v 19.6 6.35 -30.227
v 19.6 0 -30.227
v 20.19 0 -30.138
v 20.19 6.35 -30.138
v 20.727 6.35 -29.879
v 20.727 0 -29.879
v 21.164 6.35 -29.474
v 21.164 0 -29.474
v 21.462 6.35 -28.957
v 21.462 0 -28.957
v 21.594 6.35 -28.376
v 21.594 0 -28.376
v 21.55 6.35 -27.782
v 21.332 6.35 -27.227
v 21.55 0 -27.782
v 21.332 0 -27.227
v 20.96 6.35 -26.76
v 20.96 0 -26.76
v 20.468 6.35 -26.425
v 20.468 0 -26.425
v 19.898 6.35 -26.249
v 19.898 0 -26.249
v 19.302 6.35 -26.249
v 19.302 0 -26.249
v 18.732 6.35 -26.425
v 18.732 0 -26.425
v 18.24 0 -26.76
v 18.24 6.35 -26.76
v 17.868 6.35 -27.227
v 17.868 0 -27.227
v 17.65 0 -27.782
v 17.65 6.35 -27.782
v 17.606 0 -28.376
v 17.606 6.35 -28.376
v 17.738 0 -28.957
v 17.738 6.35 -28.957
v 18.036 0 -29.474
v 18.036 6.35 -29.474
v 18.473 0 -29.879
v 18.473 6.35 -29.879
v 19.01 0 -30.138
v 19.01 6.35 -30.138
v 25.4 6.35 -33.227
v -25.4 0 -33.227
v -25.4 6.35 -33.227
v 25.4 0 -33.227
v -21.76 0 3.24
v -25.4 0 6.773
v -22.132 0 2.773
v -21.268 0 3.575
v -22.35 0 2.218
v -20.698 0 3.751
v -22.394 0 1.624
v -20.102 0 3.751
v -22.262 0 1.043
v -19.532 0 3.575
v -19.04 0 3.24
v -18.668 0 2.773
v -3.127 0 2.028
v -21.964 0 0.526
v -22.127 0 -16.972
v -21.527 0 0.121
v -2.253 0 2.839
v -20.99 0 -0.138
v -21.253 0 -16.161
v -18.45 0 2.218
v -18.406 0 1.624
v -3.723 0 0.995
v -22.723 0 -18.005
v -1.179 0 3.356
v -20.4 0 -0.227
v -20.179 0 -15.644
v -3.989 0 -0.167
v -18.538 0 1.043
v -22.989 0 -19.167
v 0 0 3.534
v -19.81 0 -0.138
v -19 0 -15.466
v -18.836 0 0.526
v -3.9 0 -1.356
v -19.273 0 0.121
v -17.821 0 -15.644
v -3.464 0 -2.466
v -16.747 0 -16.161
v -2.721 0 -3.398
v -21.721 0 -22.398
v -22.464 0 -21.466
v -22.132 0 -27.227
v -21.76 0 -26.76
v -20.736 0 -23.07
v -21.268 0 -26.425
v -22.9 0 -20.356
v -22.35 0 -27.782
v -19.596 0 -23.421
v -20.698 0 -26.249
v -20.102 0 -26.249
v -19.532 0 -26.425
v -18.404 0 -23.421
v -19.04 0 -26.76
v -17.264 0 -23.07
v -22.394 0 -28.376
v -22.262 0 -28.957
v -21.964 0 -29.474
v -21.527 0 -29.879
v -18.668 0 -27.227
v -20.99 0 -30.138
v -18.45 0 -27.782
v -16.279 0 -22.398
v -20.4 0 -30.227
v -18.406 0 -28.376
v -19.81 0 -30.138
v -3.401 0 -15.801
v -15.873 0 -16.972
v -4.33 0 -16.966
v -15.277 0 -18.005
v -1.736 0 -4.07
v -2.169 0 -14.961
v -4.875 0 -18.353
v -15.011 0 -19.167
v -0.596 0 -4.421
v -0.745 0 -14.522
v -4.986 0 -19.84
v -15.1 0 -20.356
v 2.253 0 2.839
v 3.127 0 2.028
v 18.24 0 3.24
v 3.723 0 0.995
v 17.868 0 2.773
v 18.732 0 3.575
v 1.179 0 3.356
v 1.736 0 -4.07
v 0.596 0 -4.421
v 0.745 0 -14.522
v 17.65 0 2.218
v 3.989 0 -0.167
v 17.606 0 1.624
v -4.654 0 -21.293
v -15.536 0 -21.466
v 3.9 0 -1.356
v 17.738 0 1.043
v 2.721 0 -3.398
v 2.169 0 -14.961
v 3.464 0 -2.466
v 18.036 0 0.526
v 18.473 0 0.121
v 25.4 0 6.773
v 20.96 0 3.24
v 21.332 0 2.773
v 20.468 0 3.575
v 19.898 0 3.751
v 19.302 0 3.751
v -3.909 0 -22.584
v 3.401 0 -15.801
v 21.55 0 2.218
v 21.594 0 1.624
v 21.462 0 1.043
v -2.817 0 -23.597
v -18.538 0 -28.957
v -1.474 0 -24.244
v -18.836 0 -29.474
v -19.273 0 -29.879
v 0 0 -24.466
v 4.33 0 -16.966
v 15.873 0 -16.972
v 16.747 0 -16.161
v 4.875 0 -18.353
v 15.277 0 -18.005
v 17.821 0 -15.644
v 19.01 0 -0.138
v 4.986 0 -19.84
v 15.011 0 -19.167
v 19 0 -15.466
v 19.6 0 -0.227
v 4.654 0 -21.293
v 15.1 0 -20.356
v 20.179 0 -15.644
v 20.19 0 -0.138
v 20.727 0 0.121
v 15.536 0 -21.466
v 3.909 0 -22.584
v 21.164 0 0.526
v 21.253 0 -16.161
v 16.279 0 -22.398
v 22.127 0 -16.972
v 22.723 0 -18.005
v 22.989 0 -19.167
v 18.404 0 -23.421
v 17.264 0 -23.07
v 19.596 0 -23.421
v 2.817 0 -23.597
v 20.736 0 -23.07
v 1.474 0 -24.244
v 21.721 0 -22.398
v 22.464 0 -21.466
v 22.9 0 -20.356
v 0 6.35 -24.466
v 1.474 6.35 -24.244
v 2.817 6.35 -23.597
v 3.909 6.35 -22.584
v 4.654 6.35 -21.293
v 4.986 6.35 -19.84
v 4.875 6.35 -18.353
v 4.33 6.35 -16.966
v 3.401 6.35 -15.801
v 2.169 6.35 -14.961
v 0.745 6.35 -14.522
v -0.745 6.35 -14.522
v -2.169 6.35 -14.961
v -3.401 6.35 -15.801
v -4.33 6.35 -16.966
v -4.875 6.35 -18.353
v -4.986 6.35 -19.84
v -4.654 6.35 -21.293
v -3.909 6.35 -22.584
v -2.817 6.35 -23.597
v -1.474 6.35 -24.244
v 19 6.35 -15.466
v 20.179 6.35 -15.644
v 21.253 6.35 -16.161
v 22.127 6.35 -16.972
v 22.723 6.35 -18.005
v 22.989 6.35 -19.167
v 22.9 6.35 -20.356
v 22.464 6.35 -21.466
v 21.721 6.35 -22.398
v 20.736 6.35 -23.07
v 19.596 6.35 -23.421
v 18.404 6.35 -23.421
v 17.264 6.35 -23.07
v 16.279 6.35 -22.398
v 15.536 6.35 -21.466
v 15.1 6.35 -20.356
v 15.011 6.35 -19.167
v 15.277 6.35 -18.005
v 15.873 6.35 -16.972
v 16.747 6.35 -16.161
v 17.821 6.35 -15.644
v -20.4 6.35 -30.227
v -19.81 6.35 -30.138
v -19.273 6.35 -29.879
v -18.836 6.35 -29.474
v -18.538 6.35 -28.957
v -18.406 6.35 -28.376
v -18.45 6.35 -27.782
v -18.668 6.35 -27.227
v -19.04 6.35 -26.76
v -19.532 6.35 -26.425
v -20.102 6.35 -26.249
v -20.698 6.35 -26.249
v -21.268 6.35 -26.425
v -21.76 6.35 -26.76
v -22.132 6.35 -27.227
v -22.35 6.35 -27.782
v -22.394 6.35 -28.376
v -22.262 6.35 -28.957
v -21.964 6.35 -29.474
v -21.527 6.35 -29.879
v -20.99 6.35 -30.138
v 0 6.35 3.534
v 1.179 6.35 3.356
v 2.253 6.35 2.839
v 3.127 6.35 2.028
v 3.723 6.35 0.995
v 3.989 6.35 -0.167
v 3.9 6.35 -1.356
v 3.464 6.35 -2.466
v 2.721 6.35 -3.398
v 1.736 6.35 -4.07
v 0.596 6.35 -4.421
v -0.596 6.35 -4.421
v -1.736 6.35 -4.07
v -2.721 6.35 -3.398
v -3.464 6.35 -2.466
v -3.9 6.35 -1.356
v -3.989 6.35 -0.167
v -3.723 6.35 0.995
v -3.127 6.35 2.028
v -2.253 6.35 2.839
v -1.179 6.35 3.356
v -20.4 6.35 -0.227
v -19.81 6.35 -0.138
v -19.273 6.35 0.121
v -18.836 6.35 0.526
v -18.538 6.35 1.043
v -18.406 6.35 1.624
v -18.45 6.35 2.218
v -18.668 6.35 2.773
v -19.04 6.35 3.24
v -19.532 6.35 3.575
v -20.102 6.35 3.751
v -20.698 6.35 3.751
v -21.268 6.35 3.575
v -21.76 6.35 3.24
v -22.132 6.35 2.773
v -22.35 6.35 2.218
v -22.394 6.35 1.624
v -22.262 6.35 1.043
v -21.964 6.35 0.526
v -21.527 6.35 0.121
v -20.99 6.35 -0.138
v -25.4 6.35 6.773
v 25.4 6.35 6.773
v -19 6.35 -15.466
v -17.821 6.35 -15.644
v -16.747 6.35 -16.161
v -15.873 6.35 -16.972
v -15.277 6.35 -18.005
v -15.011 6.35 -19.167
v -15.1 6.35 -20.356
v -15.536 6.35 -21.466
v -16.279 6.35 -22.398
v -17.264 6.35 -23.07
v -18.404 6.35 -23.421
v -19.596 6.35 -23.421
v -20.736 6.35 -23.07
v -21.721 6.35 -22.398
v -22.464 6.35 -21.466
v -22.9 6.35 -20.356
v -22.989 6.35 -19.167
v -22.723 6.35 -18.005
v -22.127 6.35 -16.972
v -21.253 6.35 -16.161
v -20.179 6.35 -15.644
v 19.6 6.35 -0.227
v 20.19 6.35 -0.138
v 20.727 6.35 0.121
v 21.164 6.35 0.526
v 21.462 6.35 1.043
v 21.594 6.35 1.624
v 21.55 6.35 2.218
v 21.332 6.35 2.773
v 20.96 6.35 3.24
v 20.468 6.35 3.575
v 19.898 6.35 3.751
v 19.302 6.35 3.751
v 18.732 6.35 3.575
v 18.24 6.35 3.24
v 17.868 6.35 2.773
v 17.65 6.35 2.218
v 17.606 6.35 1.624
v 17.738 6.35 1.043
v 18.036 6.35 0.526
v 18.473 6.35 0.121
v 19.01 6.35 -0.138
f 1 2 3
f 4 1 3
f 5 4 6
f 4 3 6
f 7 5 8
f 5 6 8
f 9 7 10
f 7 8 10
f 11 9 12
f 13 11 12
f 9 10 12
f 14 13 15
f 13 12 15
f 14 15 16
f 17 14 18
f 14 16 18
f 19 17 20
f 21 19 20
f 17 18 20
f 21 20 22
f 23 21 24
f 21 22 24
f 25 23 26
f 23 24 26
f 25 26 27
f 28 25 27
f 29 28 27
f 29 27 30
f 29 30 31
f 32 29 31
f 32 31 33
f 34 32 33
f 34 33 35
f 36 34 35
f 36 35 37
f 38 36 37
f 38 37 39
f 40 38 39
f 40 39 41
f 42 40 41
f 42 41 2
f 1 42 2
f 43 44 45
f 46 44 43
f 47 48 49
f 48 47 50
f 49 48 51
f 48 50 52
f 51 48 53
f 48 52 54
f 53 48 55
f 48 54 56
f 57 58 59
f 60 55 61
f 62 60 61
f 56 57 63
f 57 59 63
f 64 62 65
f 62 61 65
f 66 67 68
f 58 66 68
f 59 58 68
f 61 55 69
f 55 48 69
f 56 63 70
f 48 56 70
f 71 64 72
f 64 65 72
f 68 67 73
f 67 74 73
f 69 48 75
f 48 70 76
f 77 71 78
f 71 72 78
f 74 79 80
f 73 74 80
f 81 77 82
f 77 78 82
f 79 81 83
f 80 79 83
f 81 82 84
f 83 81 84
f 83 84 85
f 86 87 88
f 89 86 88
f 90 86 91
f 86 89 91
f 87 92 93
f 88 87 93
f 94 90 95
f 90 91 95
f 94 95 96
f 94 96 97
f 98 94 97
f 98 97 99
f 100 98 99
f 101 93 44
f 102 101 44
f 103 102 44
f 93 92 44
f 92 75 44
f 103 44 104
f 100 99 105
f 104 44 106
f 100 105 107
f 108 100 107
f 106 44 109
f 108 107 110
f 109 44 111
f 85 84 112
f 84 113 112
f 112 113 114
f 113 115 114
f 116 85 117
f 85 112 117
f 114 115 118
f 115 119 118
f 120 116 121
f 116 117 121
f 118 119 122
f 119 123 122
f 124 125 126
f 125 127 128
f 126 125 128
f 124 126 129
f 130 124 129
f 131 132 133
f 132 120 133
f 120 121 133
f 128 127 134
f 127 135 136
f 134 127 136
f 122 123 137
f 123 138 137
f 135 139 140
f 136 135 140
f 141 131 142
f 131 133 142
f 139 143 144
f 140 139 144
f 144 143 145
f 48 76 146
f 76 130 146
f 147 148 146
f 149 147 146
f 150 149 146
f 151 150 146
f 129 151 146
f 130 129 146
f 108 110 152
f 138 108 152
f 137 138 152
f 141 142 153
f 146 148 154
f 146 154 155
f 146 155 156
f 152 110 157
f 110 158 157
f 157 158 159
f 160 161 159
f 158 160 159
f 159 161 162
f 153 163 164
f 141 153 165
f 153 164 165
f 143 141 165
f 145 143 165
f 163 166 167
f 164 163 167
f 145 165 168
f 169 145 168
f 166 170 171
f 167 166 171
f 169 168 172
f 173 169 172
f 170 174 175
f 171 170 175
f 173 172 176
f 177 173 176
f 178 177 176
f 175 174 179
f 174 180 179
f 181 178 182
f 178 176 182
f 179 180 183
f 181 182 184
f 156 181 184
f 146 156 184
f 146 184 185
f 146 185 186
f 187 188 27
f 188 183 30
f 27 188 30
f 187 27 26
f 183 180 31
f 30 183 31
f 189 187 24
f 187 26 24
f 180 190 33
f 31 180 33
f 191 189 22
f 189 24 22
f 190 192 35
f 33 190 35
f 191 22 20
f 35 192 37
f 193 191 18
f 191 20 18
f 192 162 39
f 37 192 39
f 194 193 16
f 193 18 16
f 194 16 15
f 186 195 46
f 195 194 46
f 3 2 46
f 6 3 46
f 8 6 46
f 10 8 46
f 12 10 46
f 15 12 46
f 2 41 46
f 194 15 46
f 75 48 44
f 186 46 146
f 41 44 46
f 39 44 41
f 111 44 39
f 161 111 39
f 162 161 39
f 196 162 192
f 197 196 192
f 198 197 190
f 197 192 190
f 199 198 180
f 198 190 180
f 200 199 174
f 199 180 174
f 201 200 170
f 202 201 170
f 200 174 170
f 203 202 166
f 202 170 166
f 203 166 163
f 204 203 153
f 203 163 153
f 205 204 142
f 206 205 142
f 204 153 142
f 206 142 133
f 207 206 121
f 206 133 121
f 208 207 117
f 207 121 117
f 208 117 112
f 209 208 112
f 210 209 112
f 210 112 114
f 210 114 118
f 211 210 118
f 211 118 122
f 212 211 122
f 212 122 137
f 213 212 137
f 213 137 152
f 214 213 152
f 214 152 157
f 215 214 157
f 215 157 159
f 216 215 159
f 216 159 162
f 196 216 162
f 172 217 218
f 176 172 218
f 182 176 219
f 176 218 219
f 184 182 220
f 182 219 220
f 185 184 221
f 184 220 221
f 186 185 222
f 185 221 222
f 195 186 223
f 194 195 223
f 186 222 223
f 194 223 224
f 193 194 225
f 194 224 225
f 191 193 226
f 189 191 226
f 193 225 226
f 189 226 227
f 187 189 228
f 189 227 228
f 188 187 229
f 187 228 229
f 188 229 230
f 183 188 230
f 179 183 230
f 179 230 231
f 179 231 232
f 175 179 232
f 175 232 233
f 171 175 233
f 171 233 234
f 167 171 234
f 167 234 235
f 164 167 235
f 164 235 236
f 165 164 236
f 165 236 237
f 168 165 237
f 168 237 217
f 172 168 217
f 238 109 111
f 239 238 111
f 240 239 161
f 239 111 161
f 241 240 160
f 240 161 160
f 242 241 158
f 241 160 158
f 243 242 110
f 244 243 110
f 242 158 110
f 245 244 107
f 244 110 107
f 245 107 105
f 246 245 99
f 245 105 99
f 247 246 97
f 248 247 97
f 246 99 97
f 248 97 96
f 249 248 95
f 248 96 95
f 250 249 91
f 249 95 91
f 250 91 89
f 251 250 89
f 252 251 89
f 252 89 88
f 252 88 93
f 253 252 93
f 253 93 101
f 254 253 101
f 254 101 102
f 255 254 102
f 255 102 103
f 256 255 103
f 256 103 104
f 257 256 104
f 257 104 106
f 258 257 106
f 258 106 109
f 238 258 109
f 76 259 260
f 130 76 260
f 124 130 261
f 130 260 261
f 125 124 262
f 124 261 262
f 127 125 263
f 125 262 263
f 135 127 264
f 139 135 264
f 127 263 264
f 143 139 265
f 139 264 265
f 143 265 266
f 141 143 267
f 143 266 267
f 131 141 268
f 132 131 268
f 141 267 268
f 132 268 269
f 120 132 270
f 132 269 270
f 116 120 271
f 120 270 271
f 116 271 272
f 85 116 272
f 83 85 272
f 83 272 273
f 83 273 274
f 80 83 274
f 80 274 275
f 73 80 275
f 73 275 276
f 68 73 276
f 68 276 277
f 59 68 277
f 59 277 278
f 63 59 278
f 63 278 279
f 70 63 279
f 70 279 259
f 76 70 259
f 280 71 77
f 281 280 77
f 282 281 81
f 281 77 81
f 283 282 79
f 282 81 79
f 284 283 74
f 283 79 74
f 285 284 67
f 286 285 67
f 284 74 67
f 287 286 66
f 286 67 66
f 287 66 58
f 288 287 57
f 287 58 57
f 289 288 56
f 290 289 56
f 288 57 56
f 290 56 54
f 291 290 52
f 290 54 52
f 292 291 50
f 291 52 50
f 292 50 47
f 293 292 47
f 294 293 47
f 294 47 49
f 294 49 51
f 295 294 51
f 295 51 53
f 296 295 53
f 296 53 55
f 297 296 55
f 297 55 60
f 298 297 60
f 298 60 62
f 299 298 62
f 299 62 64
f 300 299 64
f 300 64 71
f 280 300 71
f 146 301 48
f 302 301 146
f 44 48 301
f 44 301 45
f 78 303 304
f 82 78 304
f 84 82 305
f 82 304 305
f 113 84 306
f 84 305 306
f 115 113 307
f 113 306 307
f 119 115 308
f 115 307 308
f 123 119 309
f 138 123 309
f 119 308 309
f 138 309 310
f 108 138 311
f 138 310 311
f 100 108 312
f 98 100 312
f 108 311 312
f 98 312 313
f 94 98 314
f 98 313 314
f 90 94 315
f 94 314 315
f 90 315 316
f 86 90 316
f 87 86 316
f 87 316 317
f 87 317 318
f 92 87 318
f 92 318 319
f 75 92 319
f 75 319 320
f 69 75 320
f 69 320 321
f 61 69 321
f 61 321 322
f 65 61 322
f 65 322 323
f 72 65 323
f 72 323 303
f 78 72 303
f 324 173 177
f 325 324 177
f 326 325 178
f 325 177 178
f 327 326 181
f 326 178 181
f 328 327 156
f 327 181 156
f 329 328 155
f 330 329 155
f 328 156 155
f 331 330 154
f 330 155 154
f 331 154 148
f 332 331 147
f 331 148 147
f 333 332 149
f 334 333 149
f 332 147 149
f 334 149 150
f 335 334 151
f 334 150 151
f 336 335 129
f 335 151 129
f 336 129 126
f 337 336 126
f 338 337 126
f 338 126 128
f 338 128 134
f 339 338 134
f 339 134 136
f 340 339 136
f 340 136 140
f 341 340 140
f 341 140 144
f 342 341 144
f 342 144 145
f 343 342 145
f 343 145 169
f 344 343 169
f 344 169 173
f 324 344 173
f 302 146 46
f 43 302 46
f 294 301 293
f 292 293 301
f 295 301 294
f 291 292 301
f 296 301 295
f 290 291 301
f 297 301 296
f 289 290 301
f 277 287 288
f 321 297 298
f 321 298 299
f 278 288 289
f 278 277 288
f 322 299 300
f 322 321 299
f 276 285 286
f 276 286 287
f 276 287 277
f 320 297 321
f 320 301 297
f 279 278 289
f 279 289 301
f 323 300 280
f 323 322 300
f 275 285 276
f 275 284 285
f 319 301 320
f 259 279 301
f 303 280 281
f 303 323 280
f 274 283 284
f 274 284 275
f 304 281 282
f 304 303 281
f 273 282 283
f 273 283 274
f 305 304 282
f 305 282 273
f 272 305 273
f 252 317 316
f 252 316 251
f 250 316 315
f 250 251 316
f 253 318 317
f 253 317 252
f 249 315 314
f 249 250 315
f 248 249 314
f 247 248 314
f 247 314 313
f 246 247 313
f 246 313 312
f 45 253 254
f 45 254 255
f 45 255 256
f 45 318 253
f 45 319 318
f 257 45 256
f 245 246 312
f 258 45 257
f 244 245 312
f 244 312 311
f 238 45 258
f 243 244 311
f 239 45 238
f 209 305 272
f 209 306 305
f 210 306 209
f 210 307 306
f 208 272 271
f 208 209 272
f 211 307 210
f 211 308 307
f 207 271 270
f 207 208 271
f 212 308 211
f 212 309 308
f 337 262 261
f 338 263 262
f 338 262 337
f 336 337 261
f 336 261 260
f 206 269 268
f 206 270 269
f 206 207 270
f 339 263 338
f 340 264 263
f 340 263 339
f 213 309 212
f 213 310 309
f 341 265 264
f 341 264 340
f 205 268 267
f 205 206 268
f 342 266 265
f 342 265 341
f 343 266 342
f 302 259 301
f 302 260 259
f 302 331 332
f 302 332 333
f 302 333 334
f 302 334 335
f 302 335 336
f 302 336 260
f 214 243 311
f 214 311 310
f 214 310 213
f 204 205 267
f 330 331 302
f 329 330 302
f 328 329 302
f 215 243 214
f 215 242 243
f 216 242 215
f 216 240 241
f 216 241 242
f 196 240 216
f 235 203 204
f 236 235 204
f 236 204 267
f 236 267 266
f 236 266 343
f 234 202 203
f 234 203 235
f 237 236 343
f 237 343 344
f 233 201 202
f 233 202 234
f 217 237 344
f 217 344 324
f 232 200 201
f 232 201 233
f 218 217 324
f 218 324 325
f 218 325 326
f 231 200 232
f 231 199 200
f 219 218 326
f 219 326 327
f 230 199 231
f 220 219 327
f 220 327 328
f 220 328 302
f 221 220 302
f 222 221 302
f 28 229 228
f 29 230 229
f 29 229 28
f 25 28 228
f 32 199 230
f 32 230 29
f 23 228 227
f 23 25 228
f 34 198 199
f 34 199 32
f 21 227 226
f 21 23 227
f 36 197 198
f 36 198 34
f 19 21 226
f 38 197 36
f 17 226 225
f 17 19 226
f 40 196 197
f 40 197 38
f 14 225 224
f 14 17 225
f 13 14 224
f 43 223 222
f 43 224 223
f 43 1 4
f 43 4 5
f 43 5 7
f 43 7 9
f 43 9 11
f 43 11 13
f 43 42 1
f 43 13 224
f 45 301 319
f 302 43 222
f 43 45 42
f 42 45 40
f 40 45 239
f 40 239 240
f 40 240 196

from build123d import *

# Parameters (mm, degrees)
CROQUIS1_W              = 50.8
CROQUIS1_H              = 80
SALIENTE_EXTRUIR1_DEPTH = 6.35
CROQUIS4_R              = 4
CORTAR_EXTRUIR3_DEPTH   = 48.806720239
CROQUIS5_W              = 50.8
CROQUIS5_H              = 12.7
CORTAR_EXTRUIR4_DEPTH   = 48.806720239
CROQUIS6_W              = 50.8
CROQUIS6_H              = 20.526572449
CORTAR_EXTRUIR5_DEPTH   = 10
CROQUIS7_W              = 50.8
CROQUIS7_H              = 6.773427551
CORTAR_EXTRUIR6_DEPTH   = 10
CROQUIS9_R              = 5
CORTAR_EXTRUIR7_DEPTH   = 10
CROQUIS10_R             = 2
CORTAR_EXTRUIR8_DEPTH   = 10


with BuildPart() as part:
    # Croquis1 → Saliente-Extruir1 (new body)
    with BuildSketch(Plane(origin=(0, 0, 0), x_dir=(1, 0, 0), z_dir=(0, 1, 0))):
        Rectangle(CROQUIS1_W, CROQUIS1_H)
    extrude(amount=SALIENTE_EXTRUIR1_DEPTH)

    # Croquis4 → Cortar-Extruir3 (cut, through all)
    with BuildSketch(Plane(origin=(0, 6.35, 0), x_dir=(1, 0, 0), z_dir=(0, 1, 0))):
        with Locations(Location((-19, 19.466091849, 0), (0, 0, 270))):
            Circle(CROQUIS4_R)
        with Locations(Location((19, 19.466091849, 0), (0, 0, 270))):
            Circle(CROQUIS4_R)
        with Locations(Location((0, 0.466091849, 0), (0, 0, 270))):
            Circle(CROQUIS4_R)
    extrude(amount=-CORTAR_EXTRUIR3_DEPTH, mode=Mode.SUBTRACT)

    # Croquis5 → Cortar-Extruir4 (cut, through all)
    with BuildSketch(Plane(origin=(0, 6.35, 0), x_dir=(1, 0, 0), z_dir=(0, 1, 0))):
        with Locations((0, -33.65)):
            Rectangle(CROQUIS5_W, CROQUIS5_H)
    extrude(amount=-CORTAR_EXTRUIR4_DEPTH, mode=Mode.SUBTRACT)

    # Croquis6 → Cortar-Extruir5 (cut)
    with BuildSketch(Plane(origin=(0, 6.35, 0), x_dir=(1, 0, 0), z_dir=(0, 1, 0))):
        with Locations((0, -17.036713776)):
            Rectangle(CROQUIS6_W, CROQUIS6_H)
    extrude(amount=-CORTAR_EXTRUIR5_DEPTH, mode=Mode.SUBTRACT)

    # Croquis7 → Cortar-Extruir6 (cut)
    with BuildSketch(Plane.XZ):
        with Locations((0, -36.613286225)):
            Rectangle(CROQUIS7_W, CROQUIS7_H)
    extrude(amount=-CORTAR_EXTRUIR6_DEPTH, mode=Mode.SUBTRACT)

    # Croquis9 → Cortar-Extruir7 (cut)
    with BuildSketch(Plane.XZ):
        with Locations(Location((0, -19.466091849, 0), (0, 0, 270))):
            Circle(CROQUIS9_R)
    extrude(amount=-CORTAR_EXTRUIR7_DEPTH, mode=Mode.SUBTRACT)

    # Croquis10 → Cortar-Extruir8 (cut)
    with BuildSketch(Plane.XZ):
        with Locations(Location((-20.4, 1.773427551, 0), (0, 0, 270))):
            Circle(CROQUIS10_R)
        with Locations(Location((19.6, 1.773427551, 0), (0, 0, 270))):
            Circle(CROQUIS10_R)
        with Locations(Location((19.6, -28.226572449, 0), (0, 0, 270))):
            Circle(CROQUIS10_R)
        with Locations(Location((-20.4, -28.226572449, 0), (0, 0, 270))):
            Circle(CROQUIS10_R)
    extrude(amount=-CORTAR_EXTRUIR8_DEPTH, mode=Mode.SUBTRACT)


solid = part.part
